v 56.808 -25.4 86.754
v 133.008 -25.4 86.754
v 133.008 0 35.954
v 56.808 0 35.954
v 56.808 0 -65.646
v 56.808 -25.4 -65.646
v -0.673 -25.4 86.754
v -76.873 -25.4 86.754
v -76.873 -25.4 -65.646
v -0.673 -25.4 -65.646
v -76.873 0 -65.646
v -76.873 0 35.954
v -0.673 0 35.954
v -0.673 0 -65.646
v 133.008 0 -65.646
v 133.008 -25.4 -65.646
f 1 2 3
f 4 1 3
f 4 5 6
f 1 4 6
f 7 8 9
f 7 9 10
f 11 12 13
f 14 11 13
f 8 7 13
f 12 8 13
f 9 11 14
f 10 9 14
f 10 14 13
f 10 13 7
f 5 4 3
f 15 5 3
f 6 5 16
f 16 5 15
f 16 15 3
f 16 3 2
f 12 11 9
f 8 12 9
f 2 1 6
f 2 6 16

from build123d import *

# Parameters (mm, degrees)
F0_W     = 76.2
F0_H     = 152.4
F1_DEPTH = 25.4
F2_DEPTH = 25.4
F4_DEPTH = 76.2
F6_DEPTH = 76.2


with BuildPart() as f1:
    # F0 (on Front) → F1 (new body)
    with BuildSketch(Plane.XZ):
        with Locations((-38.7730817311, 10.5540846902)):
            Rectangle(F0_W, F0_H)
    extrude(amount=F1_DEPTH)

    # F5 (on face) → F6 (cut)
    with BuildSketch(Plane.YZ.offset(-0.6730817311)):
        Polygon((0, 86.7540846902), (-25.4, 86.7540846902), (0, 35.9540846902), align=None)
    extrude(amount=-F6_DEPTH, mode=Mode.SUBTRACT)


with BuildPart() as f2:
    # F0 (on Front) → F2 (new body)
    with BuildSketch(Plane.XZ):
        with Locations((94.90764094, 10.5540846902)):
            Rectangle(F0_W, F0_H)
    extrude(amount=F2_DEPTH)

    # F3 (on face) → F4 (cut)
    with BuildSketch(Plane.YZ.offset(133.00764094)):
        Polygon((0, 86.7540846902), (-25.4, 86.7540846902), (0, 35.9540846902), align=None)
    extrude(amount=-F4_DEPTH, mode=Mode.SUBTRACT)


solid = Compound([f1.part, f2.part])
